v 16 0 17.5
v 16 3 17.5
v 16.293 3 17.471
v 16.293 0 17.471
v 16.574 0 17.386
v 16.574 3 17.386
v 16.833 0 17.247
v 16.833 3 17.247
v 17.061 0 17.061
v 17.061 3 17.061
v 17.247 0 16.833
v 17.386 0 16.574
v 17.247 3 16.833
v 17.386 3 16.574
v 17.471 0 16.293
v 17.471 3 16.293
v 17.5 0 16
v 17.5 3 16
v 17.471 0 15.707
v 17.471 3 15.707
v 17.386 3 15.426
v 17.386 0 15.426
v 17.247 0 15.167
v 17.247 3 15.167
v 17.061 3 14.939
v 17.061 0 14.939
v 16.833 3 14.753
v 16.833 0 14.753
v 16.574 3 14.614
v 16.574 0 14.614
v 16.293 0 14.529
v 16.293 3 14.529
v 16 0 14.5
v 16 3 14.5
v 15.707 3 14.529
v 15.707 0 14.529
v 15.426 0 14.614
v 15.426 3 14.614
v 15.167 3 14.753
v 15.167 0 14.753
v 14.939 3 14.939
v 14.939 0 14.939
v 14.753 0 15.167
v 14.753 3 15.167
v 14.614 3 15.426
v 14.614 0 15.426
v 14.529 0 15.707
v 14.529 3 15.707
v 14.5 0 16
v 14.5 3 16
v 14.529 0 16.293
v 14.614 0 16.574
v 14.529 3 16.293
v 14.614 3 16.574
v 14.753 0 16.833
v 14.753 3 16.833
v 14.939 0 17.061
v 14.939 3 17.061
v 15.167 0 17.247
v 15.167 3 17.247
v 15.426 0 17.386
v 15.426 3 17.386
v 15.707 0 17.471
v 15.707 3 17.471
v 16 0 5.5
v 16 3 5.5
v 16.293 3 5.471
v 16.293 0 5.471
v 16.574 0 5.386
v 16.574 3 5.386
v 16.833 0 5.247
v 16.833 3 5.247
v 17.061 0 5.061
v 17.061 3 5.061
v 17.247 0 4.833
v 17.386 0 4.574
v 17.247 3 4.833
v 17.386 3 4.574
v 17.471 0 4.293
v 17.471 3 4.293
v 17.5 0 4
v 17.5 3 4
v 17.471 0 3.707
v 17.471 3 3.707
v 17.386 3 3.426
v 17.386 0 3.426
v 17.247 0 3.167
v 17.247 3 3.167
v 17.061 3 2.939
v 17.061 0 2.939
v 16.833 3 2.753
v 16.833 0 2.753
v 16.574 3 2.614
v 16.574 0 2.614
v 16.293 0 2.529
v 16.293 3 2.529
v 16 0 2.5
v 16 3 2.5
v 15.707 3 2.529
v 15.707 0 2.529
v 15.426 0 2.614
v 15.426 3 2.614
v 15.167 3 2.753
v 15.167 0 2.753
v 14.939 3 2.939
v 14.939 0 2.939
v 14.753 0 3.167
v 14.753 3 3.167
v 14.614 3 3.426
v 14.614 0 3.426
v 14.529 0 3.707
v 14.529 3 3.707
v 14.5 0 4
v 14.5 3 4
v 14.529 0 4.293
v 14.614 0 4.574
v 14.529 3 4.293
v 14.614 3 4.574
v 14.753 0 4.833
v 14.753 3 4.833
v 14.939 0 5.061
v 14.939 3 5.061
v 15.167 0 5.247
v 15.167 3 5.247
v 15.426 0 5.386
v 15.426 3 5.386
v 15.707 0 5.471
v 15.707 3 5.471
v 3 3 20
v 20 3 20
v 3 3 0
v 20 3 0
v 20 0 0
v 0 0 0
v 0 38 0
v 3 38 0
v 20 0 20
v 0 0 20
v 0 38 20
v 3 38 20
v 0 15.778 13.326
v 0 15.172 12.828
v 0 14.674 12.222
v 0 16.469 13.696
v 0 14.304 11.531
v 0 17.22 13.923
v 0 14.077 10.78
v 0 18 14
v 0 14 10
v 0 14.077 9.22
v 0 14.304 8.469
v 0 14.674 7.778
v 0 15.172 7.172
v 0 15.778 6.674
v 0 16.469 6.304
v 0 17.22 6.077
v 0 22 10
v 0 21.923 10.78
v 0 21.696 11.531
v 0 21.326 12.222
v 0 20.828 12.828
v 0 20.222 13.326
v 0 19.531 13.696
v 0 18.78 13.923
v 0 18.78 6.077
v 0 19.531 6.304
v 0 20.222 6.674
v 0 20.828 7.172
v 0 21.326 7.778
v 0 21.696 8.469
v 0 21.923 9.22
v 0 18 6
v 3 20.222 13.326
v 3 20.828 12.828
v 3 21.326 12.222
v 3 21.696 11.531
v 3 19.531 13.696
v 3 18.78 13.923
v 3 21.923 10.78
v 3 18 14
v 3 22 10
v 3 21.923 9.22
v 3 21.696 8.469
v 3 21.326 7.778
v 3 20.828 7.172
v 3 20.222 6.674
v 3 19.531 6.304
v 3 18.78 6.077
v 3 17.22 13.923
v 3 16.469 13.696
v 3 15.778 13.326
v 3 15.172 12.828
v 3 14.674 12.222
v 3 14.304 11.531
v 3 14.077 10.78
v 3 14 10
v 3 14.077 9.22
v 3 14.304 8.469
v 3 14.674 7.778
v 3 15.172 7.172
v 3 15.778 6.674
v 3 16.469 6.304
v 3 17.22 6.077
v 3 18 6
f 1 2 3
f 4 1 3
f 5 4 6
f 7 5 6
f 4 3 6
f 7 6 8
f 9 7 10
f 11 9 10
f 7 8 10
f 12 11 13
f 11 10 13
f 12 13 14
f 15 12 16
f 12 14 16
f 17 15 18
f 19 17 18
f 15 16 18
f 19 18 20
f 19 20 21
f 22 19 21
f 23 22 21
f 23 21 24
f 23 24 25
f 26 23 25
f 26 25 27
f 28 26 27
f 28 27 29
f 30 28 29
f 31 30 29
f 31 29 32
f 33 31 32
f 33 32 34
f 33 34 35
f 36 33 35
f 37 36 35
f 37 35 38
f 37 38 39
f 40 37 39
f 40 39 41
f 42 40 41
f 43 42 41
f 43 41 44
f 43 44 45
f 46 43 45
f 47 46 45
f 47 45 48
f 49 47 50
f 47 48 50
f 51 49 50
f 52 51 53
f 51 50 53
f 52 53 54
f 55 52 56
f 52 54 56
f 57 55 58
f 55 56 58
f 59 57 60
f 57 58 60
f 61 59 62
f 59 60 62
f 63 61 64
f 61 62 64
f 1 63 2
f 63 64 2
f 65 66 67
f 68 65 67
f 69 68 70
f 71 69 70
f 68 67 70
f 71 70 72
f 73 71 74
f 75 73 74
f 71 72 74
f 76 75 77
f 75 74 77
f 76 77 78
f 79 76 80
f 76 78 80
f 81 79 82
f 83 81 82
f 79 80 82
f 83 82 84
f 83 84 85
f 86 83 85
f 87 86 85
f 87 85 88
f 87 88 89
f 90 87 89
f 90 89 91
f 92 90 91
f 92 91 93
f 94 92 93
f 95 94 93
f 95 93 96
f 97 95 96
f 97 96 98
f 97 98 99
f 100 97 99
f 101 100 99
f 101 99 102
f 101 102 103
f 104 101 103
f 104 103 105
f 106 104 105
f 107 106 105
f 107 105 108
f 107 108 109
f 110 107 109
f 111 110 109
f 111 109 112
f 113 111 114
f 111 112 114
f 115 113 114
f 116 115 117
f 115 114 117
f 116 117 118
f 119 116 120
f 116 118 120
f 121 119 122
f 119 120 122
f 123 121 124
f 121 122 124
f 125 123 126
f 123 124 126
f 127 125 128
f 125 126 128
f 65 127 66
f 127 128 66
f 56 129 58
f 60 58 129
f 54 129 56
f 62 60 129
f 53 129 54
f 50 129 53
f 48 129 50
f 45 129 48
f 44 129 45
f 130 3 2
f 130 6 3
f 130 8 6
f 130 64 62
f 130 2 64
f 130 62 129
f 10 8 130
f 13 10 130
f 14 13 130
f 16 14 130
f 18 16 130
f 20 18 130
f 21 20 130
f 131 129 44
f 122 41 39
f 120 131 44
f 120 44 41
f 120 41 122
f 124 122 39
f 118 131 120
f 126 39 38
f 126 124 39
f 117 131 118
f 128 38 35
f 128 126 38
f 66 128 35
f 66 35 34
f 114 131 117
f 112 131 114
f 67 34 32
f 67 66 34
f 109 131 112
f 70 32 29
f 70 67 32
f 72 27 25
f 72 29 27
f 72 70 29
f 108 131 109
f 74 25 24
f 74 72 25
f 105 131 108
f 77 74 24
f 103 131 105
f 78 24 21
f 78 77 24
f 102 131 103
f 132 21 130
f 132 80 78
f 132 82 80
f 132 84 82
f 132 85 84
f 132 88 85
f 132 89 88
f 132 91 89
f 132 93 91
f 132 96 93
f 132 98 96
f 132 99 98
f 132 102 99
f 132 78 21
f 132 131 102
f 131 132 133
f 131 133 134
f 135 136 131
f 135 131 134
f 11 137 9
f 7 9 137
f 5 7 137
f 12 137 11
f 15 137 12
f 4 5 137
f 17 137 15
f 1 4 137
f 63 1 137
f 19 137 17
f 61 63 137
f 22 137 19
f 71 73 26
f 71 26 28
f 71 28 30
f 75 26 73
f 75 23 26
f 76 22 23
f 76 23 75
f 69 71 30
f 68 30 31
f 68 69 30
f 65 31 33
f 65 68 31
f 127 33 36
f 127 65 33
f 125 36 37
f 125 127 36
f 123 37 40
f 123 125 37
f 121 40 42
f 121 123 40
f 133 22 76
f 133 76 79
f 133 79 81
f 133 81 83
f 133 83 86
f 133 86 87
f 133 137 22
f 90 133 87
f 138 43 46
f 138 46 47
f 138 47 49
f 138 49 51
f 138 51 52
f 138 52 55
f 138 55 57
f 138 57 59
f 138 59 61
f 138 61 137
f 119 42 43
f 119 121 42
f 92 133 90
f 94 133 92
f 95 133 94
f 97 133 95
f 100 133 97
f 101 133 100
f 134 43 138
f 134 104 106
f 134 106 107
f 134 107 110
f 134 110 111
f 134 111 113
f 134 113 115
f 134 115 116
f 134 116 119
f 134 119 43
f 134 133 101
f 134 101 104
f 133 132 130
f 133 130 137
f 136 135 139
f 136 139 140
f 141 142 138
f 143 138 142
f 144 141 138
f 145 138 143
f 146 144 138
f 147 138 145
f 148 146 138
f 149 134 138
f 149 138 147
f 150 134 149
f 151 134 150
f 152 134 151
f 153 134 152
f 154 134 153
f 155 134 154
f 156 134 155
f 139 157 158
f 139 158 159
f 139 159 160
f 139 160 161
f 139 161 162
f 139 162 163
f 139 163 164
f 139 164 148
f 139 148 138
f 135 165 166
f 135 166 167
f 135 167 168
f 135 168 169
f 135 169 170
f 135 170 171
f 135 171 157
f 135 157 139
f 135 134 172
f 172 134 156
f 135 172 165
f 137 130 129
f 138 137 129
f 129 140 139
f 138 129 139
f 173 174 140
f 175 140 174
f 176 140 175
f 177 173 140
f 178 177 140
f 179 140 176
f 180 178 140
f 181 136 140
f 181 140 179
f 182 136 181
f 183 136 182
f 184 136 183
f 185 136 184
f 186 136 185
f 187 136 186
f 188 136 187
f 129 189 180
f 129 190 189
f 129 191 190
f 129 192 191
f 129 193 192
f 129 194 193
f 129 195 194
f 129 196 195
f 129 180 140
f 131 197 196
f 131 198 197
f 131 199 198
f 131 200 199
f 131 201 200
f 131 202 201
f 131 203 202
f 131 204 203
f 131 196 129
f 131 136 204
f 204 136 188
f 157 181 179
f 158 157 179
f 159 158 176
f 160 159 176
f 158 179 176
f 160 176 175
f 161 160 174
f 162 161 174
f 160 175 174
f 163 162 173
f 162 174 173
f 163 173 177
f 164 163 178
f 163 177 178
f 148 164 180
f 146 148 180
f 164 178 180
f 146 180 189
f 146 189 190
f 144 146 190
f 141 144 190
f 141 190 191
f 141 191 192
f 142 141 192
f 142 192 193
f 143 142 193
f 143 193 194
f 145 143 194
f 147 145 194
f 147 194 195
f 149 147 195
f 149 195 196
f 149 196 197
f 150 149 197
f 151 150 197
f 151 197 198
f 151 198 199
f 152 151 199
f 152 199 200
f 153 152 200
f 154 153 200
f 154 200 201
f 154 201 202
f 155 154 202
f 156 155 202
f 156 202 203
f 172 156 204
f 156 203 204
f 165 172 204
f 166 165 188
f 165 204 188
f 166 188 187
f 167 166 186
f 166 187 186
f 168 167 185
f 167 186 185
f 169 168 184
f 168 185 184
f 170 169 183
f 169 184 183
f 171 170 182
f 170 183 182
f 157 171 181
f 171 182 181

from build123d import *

# Parameters (mm, degrees)
EXTRUDE_1_DEPTH     = 20
SKETCH_2_R          = 1.5
CUT_EXTRUDE_1_DEPTH = 46
SKETCH_3_R          = 4
CUT_EXTRUDE_2_DEPTH = 47.184412955


with BuildPart() as part:
    # 草图1 → 凸台-拉伸1 (new body)
    with BuildSketch(Plane.XY):
        Polygon((0, 0), (0, 38), (3, 38), (3, 3), (20, 3), (20, 0), align=None)
    extrude(amount=EXTRUDE_1_DEPTH)

    # 草图2 → 切除-拉伸1 (cut, through all)
    with BuildSketch(Plane(origin=(0, 3, 0), x_dir=(1, 0, 0), z_dir=(0, 1, 0))):
        with Locations(Location((16, -16, 0), (0, 0, 270))):
            Circle(SKETCH_2_R)
        with Locations(Location((16, -4, 0), (0, 0, 270))):
            Circle(SKETCH_2_R)
    extrude(amount=-CUT_EXTRUDE_1_DEPTH, mode=Mode.SUBTRACT)

    # 草图3 → 切除-拉伸2 (cut, through all)
    with BuildSketch(Plane(origin=(3, 0, 0), x_dir=(0, 0, -1), z_dir=(1, 0, 0))):
        with Locations(Location((-10, 18, 0), (0, 0, 90))):
            Circle(SKETCH_3_R)
    extrude(amount=-CUT_EXTRUDE_2_DEPTH, mode=Mode.SUBTRACT)


solid = part.part
